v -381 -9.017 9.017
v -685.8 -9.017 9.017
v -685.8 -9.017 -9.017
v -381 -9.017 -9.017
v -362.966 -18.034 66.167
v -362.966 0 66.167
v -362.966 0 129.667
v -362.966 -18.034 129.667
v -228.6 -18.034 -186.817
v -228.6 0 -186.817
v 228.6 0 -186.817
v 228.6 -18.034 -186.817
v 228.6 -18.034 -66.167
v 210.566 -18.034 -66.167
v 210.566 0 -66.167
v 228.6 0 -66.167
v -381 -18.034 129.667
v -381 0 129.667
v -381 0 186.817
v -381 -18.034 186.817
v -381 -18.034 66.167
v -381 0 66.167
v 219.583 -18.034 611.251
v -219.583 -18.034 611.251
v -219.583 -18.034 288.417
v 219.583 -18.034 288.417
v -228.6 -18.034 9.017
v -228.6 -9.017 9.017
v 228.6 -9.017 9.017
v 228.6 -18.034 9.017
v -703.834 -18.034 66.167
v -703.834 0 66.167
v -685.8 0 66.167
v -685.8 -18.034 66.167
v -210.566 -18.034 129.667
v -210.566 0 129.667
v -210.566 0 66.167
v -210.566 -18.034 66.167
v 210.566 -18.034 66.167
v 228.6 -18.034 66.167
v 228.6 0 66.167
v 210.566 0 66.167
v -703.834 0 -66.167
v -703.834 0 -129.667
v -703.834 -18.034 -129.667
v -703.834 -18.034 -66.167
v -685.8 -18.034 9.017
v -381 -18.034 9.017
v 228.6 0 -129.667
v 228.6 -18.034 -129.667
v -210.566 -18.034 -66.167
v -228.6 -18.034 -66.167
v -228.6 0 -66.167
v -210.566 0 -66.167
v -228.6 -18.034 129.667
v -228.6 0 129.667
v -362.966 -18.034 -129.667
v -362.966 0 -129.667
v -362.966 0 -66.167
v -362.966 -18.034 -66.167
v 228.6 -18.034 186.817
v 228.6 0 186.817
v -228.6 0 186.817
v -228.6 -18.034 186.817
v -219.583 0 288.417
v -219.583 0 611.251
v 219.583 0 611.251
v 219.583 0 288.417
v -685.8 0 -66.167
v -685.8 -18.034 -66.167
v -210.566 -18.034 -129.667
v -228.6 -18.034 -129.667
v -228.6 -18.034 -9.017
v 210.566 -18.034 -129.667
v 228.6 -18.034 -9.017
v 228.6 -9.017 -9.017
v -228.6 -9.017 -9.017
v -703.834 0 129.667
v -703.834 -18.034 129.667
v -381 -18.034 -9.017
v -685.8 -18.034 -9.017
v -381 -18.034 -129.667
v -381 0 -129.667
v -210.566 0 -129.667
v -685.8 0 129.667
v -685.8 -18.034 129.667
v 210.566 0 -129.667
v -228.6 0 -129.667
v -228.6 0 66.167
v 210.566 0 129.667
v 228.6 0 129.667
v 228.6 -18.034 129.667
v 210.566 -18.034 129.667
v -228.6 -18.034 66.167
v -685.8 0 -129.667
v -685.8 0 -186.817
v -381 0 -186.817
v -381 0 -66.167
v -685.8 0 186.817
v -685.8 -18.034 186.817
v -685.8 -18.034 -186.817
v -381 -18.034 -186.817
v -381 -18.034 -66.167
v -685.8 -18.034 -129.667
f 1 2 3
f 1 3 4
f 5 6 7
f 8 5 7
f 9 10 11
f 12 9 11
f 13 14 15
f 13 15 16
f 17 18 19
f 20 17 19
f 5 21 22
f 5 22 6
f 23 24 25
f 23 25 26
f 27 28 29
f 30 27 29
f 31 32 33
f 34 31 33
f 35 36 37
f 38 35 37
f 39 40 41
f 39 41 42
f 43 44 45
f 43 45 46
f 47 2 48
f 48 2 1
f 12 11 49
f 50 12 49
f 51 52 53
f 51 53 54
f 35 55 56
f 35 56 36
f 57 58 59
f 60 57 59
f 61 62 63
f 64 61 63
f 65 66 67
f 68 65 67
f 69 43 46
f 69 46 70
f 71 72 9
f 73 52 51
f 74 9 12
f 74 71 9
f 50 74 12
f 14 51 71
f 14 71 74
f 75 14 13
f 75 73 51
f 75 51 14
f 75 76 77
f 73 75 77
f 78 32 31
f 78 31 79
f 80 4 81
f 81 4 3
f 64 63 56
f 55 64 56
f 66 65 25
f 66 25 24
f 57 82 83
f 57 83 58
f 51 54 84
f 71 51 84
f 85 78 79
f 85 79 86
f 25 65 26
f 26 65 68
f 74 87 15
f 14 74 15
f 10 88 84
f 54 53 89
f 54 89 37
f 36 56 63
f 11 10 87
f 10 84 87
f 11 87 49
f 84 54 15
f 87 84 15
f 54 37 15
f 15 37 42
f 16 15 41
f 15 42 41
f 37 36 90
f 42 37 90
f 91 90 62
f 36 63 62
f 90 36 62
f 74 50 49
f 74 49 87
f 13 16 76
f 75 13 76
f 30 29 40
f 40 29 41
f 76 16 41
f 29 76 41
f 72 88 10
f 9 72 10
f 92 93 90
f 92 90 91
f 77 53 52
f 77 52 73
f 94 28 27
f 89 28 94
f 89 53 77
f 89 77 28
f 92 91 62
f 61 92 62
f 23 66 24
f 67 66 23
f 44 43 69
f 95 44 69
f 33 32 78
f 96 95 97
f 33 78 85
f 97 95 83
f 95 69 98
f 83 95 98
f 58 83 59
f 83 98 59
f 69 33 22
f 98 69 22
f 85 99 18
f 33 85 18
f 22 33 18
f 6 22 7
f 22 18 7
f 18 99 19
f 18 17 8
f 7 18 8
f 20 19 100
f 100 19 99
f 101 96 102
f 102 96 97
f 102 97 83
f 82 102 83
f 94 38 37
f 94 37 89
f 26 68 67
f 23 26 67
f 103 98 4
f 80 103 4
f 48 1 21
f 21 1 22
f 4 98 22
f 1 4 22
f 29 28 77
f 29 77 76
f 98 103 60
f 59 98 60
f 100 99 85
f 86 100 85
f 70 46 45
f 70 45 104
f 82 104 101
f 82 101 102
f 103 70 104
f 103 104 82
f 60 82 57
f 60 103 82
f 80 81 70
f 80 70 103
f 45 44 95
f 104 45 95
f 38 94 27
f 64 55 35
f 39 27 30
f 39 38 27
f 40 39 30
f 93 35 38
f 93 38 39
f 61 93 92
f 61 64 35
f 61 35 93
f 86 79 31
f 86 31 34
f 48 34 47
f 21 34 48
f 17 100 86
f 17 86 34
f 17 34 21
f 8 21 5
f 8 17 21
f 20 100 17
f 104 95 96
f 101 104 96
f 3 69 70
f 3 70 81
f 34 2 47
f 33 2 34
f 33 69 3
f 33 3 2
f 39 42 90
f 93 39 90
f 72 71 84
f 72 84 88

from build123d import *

# Parameters (mm, degrees)
F1_W     = 18.034
F1_H     = 63.5
F2_DEPTH = 18.034
F1_W_2   = 439.166
F1_H_2   = 322.834
F1_W_3   = 304.8
F1_H_3   = 18.034
F3_DEPTH = 9.017
F1_W_4   = 457.2


# Not quite as in the source:
# - a variable given as a bare number and used for a length is read in inches; the dataset says mm whatever the document's units were
# - a feature names something its author has since deleted; it is built from what else it names


with BuildPart() as f2:
    # F1 (on Front) → F2 (new body)
    with BuildSketch(Plane.XZ):
        Polygon((-381, 129.667), (-381, 186.817), (-685.8, 186.817), (-685.8, 129.667), (-685.8, 66.167), (-685.8, 9.017), (-381, 9.017), (-381, 66.167), align=None)
        with Locations((-694.817, 97.917)):
            Rectangle(F1_W, F1_H)
        with Locations((-371.983, 97.917)):
            Rectangle(F1_W, F1_H)
    extrude(amount=F2_DEPTH)



with BuildPart() as f2b:
    # F1 (on Front) → F2, piece 2 (new body)
    with BuildSketch(Plane.XZ):
        with Locations((-694.817, -97.917)):
            Rectangle(F1_W, F1_H)
        with Locations((-371.983, -97.917)):
            Rectangle(F1_W, F1_H)
        Polygon((-381, -66.167), (-381, -9.017), (-685.8, -9.017), (-685.8, -66.167), (-685.8, -129.667), (-685.8, -186.817), (-381, -186.817), (-381, -129.667), align=None)
    extrude(amount=F2_DEPTH)


with BuildPart() as f2c:
    # F1 (on Front) → F2, piece 3 (new body)
    with BuildSketch(Plane.XZ):
        Polygon((228.6, -9.017), (-228.6, -9.017), (-228.6, -66.167), (-210.566, -66.167), (-210.566, -129.667), (-228.6, -129.667), (-228.6, -186.817), (228.6, -186.817), (228.6, -129.667), (210.566, -129.667), (210.566, -66.167), (228.6, -66.167), align=None)
    extrude(amount=F2_DEPTH)



with BuildPart() as f2d:
    # F1 (on Front) → F2, piece 4 (new body)
    with BuildSketch(Plane.XZ):
        Polygon((228.6, 186.817), (-228.6, 186.817), (-228.6, 129.667), (-210.566, 129.667), (-210.566, 66.167), (-228.6, 66.167), (-228.6, 9.017), (228.6, 9.017), (228.6, 66.167), (210.566, 66.167), (210.566, 129.667), (228.6, 129.667), align=None)
    extrude(amount=F2_DEPTH)


with BuildPart() as f2e:
    # F1 (on Front) → F2, piece 5 (new body)
    with BuildSketch(Plane.XZ):
        with Locations((0, 449.834)):
            Rectangle(F1_W_2, F1_H_2)
    extrude(amount=F2_DEPTH)


with BuildPart() as f2_1:
    add(f2.part)

    add(f2b.part)  # F3 merges F2b
    # F1 (on Front) → F3 (join)
    with BuildSketch(Plane.XZ):
        with Locations((-533.4, 0)):
            Rectangle(F1_W_3, F1_H_3)
    extrude(amount=F3_DEPTH)


with BuildPart() as f2c_1:
    add(f2c.part)

    add(f2d.part)  # F3#2 merges F2d
    # F1 (on Front) → F3, piece 2 (join)
    with BuildSketch(Plane.XZ):
        Rectangle(F1_W_4, F1_H_3)
    extrude(amount=F3_DEPTH)


solid = Compound([f2e.part, f2_1.part, f2c_1.part])
